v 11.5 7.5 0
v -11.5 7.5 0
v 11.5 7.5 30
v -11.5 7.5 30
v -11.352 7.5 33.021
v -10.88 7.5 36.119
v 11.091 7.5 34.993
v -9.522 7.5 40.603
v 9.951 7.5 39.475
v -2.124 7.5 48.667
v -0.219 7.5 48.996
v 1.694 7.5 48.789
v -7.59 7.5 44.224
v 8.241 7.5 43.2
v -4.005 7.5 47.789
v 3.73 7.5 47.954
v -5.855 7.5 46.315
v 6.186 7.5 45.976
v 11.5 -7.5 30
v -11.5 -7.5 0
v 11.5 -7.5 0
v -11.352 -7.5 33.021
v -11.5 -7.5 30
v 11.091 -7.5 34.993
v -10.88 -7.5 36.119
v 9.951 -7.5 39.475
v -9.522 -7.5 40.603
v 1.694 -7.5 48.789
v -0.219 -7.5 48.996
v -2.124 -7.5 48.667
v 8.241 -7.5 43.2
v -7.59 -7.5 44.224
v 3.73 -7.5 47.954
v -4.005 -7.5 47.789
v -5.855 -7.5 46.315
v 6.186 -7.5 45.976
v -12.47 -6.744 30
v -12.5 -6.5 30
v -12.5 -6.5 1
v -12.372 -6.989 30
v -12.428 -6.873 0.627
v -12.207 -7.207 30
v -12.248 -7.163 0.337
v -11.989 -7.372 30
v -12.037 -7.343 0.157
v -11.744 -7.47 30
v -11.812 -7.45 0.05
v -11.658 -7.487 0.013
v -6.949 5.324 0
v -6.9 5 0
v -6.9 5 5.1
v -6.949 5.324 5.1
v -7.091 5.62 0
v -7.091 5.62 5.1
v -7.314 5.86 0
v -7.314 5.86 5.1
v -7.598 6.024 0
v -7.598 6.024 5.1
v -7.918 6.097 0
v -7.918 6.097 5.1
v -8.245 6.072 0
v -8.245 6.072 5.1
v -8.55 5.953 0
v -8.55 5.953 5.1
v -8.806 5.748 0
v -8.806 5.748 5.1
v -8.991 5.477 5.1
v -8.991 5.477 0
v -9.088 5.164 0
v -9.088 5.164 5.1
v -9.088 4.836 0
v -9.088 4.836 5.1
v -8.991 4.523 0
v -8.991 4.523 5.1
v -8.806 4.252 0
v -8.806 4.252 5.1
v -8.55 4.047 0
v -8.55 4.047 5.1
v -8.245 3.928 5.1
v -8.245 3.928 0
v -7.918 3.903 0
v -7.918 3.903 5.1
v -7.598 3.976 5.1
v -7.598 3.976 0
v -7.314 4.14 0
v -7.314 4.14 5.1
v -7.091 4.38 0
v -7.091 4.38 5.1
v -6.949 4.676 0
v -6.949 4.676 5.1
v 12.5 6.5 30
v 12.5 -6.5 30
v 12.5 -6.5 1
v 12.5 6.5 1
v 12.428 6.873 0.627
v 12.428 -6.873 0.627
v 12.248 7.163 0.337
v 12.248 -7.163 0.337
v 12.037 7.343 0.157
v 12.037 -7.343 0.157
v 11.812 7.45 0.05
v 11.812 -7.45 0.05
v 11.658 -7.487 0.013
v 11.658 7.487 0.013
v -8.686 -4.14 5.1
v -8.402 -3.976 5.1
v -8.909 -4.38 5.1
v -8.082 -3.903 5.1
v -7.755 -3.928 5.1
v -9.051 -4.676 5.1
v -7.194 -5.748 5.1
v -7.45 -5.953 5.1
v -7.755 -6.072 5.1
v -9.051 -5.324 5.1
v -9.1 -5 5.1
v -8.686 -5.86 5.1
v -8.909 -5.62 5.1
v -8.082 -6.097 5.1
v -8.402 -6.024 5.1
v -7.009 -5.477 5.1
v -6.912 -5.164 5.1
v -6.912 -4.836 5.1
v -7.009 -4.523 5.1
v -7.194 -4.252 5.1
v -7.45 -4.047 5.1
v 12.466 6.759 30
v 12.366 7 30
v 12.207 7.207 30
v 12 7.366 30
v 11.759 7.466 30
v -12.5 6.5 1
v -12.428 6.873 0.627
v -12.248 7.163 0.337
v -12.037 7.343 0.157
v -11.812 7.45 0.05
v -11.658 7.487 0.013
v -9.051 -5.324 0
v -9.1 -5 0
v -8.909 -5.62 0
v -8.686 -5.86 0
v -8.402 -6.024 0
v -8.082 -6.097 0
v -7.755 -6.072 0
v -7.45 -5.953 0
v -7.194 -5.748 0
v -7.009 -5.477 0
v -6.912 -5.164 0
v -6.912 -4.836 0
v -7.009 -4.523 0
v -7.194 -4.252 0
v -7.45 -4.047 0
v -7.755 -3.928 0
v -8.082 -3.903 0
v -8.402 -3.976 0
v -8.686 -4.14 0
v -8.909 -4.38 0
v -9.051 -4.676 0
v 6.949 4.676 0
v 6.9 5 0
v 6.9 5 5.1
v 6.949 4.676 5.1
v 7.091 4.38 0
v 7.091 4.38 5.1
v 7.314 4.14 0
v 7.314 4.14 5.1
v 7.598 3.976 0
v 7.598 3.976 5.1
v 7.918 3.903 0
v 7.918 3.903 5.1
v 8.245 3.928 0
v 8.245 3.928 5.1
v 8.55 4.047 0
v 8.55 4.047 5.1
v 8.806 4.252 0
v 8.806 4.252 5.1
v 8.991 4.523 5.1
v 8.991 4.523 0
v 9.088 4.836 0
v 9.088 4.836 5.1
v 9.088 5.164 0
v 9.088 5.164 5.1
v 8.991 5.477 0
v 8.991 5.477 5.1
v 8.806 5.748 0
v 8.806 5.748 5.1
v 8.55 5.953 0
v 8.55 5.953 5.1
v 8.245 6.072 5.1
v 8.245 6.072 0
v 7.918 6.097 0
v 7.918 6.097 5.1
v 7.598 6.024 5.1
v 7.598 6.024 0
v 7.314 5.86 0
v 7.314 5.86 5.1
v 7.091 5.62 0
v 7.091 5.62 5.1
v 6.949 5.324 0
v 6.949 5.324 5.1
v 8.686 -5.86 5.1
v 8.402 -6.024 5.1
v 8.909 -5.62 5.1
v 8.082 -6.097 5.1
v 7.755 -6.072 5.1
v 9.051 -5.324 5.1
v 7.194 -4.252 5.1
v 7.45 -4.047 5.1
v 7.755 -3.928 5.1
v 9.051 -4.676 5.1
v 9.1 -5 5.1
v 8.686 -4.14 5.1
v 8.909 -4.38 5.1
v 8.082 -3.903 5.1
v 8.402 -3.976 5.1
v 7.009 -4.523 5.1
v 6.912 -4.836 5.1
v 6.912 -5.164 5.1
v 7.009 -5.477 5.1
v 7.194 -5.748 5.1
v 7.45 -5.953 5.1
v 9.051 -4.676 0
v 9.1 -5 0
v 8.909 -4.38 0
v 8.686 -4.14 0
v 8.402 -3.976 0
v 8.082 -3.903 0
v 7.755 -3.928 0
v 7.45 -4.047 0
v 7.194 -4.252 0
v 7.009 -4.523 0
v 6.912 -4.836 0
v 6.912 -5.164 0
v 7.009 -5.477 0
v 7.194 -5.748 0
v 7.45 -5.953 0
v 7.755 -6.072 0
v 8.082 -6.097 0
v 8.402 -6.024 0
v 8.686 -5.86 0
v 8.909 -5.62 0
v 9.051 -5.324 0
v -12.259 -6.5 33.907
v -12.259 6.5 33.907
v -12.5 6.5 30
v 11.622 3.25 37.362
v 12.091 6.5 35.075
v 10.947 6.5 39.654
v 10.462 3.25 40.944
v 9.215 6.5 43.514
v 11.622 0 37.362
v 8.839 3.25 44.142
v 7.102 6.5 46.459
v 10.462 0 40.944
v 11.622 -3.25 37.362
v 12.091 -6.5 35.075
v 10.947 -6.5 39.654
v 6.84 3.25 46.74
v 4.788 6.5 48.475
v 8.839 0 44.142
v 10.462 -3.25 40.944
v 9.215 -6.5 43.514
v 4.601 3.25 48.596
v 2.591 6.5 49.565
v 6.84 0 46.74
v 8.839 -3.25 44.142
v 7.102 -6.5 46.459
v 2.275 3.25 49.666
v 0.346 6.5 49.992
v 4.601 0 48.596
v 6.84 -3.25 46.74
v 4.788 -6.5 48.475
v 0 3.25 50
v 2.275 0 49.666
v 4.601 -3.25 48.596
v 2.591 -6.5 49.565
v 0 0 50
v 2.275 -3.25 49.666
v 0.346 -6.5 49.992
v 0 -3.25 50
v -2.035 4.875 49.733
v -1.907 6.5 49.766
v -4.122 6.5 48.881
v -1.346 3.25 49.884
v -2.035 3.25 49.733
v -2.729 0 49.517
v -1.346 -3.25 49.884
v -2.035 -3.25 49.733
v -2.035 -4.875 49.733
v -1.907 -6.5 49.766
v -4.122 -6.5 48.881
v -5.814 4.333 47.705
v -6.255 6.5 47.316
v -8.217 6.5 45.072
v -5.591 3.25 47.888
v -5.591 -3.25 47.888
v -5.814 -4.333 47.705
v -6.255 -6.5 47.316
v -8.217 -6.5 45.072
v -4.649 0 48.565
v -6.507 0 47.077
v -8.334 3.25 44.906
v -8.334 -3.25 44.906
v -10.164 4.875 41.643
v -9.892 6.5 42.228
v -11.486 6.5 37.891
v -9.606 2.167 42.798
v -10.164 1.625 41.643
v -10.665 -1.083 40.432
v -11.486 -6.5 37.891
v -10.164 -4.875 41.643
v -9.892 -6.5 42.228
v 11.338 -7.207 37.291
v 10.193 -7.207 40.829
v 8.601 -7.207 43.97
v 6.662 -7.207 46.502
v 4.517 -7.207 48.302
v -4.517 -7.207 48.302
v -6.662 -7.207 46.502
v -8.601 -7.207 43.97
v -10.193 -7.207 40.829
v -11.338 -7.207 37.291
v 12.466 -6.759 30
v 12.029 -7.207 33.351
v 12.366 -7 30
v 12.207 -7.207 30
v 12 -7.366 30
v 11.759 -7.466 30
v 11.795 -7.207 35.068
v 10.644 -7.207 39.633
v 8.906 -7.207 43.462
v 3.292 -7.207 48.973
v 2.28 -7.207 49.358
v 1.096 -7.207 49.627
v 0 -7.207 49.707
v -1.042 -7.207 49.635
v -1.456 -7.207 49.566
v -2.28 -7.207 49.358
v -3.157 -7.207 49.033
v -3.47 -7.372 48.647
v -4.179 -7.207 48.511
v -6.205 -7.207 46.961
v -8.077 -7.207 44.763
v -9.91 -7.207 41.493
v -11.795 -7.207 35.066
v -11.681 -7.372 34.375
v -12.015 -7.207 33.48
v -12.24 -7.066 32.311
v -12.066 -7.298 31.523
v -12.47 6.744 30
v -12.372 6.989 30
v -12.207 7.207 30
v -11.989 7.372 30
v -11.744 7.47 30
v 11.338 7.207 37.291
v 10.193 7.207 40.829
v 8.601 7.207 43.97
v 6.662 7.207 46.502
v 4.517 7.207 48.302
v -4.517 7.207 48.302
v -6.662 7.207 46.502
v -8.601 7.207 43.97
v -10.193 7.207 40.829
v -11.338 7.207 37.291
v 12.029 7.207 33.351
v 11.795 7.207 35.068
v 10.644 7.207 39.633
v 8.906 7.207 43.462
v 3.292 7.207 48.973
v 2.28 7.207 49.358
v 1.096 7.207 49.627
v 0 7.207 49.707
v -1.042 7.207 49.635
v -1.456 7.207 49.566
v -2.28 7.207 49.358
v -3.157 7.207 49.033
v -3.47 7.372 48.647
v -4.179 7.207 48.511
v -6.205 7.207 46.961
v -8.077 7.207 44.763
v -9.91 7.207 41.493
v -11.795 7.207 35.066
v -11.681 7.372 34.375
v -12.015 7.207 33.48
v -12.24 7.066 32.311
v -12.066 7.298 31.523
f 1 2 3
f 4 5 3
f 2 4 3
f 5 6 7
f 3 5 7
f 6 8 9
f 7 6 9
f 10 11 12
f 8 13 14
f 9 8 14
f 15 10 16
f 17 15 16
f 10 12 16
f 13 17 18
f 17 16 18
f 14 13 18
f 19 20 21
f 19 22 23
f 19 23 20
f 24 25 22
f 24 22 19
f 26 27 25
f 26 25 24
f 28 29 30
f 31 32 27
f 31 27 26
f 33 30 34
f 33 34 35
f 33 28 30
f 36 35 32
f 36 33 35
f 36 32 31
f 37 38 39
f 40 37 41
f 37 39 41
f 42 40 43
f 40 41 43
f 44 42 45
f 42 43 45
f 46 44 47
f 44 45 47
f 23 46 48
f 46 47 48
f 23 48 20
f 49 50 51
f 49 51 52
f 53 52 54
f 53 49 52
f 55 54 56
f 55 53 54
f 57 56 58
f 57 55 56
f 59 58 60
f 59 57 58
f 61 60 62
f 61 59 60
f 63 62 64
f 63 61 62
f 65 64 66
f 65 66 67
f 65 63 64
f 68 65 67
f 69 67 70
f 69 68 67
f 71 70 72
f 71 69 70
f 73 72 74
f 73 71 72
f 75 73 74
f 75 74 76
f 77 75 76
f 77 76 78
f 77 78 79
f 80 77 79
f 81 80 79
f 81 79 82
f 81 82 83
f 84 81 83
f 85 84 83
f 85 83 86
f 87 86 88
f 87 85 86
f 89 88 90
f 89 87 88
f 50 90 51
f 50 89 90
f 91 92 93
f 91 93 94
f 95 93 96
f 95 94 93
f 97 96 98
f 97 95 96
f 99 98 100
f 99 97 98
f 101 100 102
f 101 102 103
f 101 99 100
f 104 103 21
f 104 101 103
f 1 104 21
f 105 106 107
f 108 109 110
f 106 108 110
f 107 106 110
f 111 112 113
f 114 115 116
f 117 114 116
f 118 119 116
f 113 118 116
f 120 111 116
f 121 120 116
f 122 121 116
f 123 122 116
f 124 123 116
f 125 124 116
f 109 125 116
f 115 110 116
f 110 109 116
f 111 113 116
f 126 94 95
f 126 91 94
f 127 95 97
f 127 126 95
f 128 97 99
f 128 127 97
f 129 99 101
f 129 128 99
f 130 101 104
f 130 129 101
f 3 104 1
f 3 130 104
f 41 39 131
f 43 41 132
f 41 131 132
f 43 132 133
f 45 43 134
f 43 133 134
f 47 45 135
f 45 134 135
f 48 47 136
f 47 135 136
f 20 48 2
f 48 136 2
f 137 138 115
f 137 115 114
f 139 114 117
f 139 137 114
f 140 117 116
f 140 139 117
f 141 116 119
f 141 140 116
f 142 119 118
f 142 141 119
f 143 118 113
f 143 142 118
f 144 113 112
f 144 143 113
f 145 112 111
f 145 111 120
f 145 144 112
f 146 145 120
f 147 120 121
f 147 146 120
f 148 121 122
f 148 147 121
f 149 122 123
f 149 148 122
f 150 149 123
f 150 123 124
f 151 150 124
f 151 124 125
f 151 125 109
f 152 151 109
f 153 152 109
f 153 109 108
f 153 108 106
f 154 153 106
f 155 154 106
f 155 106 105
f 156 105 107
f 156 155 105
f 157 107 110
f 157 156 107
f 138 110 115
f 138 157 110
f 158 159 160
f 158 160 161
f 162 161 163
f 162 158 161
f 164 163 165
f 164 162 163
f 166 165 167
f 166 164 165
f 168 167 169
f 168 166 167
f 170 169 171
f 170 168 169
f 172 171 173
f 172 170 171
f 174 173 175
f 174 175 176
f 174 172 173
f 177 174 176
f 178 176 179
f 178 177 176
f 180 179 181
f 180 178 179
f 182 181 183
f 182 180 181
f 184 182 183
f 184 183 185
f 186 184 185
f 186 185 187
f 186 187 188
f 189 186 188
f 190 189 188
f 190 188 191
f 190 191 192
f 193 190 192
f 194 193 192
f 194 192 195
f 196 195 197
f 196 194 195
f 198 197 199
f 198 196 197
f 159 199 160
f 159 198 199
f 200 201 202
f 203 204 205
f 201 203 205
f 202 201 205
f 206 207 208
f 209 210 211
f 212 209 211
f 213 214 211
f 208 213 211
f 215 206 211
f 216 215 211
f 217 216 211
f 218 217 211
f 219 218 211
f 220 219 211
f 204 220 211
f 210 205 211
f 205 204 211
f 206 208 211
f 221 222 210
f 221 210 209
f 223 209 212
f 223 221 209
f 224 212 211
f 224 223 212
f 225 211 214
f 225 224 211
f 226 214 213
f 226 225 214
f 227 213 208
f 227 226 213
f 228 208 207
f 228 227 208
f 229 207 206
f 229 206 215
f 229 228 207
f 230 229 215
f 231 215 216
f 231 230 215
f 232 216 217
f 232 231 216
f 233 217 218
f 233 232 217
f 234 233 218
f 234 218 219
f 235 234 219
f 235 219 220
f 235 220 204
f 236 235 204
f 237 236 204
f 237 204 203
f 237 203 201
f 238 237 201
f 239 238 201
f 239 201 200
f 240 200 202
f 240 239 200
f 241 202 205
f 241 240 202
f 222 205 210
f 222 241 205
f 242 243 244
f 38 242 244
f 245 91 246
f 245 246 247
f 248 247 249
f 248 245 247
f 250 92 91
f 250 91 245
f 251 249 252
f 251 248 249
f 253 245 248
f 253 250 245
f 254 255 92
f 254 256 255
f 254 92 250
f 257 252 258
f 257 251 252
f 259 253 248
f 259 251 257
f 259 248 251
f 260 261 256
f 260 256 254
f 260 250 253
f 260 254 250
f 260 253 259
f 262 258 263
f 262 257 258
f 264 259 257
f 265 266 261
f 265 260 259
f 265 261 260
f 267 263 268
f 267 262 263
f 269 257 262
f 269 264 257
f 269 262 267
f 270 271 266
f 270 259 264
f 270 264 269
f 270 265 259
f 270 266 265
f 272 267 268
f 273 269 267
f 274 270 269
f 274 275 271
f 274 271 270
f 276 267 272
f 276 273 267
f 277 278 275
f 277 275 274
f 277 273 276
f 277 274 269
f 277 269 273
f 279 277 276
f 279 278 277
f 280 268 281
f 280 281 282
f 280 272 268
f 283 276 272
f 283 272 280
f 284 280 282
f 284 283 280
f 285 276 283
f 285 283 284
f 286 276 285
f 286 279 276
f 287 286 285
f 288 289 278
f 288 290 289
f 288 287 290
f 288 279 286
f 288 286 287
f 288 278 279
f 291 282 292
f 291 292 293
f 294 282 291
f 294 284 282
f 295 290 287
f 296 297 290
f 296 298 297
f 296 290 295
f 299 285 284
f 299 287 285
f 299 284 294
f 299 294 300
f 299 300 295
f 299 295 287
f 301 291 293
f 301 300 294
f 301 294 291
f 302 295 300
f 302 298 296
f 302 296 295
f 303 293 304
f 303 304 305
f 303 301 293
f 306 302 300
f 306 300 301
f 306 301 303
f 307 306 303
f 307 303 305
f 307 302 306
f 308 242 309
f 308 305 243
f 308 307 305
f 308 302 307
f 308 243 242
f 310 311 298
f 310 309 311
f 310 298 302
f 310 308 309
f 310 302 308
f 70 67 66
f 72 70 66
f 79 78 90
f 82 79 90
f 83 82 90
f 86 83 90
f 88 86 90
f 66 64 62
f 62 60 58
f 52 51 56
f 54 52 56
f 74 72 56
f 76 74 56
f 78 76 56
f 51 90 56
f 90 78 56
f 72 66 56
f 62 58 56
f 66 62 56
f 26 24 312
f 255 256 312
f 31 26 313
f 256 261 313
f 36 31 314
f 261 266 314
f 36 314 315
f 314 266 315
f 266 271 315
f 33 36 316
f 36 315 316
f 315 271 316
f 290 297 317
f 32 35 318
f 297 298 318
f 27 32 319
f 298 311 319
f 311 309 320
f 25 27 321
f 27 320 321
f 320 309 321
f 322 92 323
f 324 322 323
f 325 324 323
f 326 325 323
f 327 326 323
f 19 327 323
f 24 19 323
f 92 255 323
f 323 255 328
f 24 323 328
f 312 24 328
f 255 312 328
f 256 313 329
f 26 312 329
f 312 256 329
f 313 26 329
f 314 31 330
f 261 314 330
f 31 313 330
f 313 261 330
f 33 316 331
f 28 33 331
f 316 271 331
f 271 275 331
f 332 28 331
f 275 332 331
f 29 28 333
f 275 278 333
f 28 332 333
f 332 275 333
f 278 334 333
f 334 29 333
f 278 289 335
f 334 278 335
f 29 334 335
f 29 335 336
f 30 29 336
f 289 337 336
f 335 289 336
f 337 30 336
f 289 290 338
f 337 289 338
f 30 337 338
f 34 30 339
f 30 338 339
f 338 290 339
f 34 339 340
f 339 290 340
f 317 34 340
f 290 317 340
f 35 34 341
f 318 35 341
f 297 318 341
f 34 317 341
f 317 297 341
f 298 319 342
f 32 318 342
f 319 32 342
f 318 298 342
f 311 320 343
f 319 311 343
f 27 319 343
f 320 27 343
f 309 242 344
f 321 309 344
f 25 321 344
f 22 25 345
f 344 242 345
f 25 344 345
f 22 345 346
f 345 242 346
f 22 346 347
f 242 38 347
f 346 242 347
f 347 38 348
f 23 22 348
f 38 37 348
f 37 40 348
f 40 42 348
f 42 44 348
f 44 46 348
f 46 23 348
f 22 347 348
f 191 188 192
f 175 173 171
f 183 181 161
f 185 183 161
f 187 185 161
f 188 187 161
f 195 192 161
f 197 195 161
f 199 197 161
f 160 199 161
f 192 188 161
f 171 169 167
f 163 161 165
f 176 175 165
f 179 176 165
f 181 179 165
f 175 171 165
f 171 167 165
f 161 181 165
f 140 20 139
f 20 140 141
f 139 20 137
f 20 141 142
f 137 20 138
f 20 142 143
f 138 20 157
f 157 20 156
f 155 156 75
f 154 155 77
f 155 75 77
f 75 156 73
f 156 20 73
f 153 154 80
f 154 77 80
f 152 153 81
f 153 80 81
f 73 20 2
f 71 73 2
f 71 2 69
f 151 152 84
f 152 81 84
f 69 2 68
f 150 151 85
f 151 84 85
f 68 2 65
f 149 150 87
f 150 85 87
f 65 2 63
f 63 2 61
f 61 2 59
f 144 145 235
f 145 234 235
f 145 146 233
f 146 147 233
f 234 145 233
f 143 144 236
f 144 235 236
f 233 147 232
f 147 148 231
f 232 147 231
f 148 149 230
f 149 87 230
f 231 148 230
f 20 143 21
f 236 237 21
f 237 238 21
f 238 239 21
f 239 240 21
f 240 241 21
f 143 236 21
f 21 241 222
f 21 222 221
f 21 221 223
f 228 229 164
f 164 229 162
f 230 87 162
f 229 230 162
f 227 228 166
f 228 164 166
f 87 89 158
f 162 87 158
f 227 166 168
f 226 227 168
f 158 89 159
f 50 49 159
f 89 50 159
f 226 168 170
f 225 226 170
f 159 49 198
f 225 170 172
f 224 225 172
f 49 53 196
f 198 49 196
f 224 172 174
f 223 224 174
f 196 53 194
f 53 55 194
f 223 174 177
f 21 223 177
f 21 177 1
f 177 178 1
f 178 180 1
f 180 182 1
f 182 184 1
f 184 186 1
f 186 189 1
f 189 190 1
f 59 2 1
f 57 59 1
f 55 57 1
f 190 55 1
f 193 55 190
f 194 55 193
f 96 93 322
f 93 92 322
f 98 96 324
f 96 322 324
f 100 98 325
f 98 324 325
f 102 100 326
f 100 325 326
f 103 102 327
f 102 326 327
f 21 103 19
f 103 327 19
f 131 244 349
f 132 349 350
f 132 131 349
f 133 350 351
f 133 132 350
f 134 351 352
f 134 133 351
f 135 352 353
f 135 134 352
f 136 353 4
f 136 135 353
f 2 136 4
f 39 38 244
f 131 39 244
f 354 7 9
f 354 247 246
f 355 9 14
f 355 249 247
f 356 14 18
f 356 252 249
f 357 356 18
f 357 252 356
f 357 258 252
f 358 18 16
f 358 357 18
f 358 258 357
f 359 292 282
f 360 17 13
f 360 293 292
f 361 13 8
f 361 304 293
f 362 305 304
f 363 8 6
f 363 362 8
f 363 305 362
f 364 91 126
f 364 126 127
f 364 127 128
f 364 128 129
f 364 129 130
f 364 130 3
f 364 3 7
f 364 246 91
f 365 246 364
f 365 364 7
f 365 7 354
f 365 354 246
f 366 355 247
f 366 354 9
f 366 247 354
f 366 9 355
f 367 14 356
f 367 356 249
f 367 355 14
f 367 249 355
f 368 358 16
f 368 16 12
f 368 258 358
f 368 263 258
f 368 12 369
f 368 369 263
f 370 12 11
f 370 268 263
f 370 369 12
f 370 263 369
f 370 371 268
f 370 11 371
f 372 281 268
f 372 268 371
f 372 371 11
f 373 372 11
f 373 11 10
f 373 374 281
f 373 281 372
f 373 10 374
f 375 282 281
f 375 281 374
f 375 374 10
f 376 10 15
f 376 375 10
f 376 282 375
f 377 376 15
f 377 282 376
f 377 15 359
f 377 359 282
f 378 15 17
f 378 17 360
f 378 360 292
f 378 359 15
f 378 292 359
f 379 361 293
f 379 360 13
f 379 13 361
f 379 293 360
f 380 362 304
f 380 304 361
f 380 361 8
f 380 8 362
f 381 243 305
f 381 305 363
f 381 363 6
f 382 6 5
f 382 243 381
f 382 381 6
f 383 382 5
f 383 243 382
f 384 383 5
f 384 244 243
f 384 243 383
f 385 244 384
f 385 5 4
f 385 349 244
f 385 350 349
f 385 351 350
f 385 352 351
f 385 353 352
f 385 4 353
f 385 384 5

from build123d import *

# Parameters (mm, degrees)
SKETCH1_W           = 25
SKETCH1_H           = 15
BASE_DEPTH          = 30
SKETCH1_3_R         = 1.1
M2X10MM_PIN_DEPTH   = 5.1
BOSS_EXTRUDE2_DEPTH = 15
FILLET1_R           = 1


with BuildPart() as part:
    # Sketch1 → base (new body)
    with BuildSketch(Plane.XY):
        Rectangle(SKETCH1_W, SKETCH1_H)
    extrude(amount=BASE_DEPTH)

    # Sketch1<3> → m2x10mm_pin (cut)
    with BuildSketch(Plane.XY):
        with Locations((-8, 5)):
            Circle(SKETCH1_3_R)
        with Locations(Location((8, 5, 0), (0, 0, 180))):
            Circle(SKETCH1_3_R)
        with Locations((8, -5)):
            Circle(SKETCH1_3_R)
        with Locations(Location((-8, -5, 0), (0, 0, 180))):
            Circle(SKETCH1_3_R)
    extrude(amount=M2X10MM_PIN_DEPTH, mode=Mode.SUBTRACT)

    # Sketch2 → Boss-Extrude2 (add)
    with BuildSketch(Plane.XZ.offset(7.5)):
        with BuildLine():
            add(Edge.make_bspline(
                [(-12.5, 30), (-12.5, 10), (0, 10), (12.5, 10), (12.5, 30)],
                knots=[1.570796327, 1.570796327, 1.570796327, 3.141592654, 3.141592654, 4.71238898, 4.71238898, 4.71238898], degree=2, weights=[1, 0.707106781, 1, 0.707106781, 1]))
            Line((12.5, 30), (-12.5, 30))
        make_face()
        with BuildLine():
            Line((-12.5, 30), (12.5, 30))
            add(Edge.make_bspline(
                [(12.5, 30), (12.5, 50), (0, 50)],
                knots=[4.71238898, 4.71238898, 4.71238898, 6.283185307, 6.283185307, 6.283185307], degree=2, weights=[1, 0.707106781, 1]))
            add(Edge.make_bspline(
                [(0, 50), (-12.5, 50), (-12.5, 30)],
                knots=[0, 0, 0, 1.570796327, 1.570796327, 1.570796327], degree=2, weights=[1, 0.707106781, 1]))
        make_face()
    extrude(amount=-BOSS_EXTRUDE2_DEPTH)

    # Fillet1
    fillet1_edges = [part.edges().sort_by_distance(p)[0] for p in [
        (-9.747017885, -7.5, 42.521535226),
        (-9.747017885, 7.5, 42.521535226),
        (12.5, 0, 0),
        (-12.5, 0, 0),
        (12.5, -7.5, 15),
        (12.5, 7.5, 15),
        (-12.5, 7.5, 15),
        (-12.5, -7.5, 15),
    ]]
    fillet(fillet1_edges, radius=FILLET1_R)


solid = part.part
